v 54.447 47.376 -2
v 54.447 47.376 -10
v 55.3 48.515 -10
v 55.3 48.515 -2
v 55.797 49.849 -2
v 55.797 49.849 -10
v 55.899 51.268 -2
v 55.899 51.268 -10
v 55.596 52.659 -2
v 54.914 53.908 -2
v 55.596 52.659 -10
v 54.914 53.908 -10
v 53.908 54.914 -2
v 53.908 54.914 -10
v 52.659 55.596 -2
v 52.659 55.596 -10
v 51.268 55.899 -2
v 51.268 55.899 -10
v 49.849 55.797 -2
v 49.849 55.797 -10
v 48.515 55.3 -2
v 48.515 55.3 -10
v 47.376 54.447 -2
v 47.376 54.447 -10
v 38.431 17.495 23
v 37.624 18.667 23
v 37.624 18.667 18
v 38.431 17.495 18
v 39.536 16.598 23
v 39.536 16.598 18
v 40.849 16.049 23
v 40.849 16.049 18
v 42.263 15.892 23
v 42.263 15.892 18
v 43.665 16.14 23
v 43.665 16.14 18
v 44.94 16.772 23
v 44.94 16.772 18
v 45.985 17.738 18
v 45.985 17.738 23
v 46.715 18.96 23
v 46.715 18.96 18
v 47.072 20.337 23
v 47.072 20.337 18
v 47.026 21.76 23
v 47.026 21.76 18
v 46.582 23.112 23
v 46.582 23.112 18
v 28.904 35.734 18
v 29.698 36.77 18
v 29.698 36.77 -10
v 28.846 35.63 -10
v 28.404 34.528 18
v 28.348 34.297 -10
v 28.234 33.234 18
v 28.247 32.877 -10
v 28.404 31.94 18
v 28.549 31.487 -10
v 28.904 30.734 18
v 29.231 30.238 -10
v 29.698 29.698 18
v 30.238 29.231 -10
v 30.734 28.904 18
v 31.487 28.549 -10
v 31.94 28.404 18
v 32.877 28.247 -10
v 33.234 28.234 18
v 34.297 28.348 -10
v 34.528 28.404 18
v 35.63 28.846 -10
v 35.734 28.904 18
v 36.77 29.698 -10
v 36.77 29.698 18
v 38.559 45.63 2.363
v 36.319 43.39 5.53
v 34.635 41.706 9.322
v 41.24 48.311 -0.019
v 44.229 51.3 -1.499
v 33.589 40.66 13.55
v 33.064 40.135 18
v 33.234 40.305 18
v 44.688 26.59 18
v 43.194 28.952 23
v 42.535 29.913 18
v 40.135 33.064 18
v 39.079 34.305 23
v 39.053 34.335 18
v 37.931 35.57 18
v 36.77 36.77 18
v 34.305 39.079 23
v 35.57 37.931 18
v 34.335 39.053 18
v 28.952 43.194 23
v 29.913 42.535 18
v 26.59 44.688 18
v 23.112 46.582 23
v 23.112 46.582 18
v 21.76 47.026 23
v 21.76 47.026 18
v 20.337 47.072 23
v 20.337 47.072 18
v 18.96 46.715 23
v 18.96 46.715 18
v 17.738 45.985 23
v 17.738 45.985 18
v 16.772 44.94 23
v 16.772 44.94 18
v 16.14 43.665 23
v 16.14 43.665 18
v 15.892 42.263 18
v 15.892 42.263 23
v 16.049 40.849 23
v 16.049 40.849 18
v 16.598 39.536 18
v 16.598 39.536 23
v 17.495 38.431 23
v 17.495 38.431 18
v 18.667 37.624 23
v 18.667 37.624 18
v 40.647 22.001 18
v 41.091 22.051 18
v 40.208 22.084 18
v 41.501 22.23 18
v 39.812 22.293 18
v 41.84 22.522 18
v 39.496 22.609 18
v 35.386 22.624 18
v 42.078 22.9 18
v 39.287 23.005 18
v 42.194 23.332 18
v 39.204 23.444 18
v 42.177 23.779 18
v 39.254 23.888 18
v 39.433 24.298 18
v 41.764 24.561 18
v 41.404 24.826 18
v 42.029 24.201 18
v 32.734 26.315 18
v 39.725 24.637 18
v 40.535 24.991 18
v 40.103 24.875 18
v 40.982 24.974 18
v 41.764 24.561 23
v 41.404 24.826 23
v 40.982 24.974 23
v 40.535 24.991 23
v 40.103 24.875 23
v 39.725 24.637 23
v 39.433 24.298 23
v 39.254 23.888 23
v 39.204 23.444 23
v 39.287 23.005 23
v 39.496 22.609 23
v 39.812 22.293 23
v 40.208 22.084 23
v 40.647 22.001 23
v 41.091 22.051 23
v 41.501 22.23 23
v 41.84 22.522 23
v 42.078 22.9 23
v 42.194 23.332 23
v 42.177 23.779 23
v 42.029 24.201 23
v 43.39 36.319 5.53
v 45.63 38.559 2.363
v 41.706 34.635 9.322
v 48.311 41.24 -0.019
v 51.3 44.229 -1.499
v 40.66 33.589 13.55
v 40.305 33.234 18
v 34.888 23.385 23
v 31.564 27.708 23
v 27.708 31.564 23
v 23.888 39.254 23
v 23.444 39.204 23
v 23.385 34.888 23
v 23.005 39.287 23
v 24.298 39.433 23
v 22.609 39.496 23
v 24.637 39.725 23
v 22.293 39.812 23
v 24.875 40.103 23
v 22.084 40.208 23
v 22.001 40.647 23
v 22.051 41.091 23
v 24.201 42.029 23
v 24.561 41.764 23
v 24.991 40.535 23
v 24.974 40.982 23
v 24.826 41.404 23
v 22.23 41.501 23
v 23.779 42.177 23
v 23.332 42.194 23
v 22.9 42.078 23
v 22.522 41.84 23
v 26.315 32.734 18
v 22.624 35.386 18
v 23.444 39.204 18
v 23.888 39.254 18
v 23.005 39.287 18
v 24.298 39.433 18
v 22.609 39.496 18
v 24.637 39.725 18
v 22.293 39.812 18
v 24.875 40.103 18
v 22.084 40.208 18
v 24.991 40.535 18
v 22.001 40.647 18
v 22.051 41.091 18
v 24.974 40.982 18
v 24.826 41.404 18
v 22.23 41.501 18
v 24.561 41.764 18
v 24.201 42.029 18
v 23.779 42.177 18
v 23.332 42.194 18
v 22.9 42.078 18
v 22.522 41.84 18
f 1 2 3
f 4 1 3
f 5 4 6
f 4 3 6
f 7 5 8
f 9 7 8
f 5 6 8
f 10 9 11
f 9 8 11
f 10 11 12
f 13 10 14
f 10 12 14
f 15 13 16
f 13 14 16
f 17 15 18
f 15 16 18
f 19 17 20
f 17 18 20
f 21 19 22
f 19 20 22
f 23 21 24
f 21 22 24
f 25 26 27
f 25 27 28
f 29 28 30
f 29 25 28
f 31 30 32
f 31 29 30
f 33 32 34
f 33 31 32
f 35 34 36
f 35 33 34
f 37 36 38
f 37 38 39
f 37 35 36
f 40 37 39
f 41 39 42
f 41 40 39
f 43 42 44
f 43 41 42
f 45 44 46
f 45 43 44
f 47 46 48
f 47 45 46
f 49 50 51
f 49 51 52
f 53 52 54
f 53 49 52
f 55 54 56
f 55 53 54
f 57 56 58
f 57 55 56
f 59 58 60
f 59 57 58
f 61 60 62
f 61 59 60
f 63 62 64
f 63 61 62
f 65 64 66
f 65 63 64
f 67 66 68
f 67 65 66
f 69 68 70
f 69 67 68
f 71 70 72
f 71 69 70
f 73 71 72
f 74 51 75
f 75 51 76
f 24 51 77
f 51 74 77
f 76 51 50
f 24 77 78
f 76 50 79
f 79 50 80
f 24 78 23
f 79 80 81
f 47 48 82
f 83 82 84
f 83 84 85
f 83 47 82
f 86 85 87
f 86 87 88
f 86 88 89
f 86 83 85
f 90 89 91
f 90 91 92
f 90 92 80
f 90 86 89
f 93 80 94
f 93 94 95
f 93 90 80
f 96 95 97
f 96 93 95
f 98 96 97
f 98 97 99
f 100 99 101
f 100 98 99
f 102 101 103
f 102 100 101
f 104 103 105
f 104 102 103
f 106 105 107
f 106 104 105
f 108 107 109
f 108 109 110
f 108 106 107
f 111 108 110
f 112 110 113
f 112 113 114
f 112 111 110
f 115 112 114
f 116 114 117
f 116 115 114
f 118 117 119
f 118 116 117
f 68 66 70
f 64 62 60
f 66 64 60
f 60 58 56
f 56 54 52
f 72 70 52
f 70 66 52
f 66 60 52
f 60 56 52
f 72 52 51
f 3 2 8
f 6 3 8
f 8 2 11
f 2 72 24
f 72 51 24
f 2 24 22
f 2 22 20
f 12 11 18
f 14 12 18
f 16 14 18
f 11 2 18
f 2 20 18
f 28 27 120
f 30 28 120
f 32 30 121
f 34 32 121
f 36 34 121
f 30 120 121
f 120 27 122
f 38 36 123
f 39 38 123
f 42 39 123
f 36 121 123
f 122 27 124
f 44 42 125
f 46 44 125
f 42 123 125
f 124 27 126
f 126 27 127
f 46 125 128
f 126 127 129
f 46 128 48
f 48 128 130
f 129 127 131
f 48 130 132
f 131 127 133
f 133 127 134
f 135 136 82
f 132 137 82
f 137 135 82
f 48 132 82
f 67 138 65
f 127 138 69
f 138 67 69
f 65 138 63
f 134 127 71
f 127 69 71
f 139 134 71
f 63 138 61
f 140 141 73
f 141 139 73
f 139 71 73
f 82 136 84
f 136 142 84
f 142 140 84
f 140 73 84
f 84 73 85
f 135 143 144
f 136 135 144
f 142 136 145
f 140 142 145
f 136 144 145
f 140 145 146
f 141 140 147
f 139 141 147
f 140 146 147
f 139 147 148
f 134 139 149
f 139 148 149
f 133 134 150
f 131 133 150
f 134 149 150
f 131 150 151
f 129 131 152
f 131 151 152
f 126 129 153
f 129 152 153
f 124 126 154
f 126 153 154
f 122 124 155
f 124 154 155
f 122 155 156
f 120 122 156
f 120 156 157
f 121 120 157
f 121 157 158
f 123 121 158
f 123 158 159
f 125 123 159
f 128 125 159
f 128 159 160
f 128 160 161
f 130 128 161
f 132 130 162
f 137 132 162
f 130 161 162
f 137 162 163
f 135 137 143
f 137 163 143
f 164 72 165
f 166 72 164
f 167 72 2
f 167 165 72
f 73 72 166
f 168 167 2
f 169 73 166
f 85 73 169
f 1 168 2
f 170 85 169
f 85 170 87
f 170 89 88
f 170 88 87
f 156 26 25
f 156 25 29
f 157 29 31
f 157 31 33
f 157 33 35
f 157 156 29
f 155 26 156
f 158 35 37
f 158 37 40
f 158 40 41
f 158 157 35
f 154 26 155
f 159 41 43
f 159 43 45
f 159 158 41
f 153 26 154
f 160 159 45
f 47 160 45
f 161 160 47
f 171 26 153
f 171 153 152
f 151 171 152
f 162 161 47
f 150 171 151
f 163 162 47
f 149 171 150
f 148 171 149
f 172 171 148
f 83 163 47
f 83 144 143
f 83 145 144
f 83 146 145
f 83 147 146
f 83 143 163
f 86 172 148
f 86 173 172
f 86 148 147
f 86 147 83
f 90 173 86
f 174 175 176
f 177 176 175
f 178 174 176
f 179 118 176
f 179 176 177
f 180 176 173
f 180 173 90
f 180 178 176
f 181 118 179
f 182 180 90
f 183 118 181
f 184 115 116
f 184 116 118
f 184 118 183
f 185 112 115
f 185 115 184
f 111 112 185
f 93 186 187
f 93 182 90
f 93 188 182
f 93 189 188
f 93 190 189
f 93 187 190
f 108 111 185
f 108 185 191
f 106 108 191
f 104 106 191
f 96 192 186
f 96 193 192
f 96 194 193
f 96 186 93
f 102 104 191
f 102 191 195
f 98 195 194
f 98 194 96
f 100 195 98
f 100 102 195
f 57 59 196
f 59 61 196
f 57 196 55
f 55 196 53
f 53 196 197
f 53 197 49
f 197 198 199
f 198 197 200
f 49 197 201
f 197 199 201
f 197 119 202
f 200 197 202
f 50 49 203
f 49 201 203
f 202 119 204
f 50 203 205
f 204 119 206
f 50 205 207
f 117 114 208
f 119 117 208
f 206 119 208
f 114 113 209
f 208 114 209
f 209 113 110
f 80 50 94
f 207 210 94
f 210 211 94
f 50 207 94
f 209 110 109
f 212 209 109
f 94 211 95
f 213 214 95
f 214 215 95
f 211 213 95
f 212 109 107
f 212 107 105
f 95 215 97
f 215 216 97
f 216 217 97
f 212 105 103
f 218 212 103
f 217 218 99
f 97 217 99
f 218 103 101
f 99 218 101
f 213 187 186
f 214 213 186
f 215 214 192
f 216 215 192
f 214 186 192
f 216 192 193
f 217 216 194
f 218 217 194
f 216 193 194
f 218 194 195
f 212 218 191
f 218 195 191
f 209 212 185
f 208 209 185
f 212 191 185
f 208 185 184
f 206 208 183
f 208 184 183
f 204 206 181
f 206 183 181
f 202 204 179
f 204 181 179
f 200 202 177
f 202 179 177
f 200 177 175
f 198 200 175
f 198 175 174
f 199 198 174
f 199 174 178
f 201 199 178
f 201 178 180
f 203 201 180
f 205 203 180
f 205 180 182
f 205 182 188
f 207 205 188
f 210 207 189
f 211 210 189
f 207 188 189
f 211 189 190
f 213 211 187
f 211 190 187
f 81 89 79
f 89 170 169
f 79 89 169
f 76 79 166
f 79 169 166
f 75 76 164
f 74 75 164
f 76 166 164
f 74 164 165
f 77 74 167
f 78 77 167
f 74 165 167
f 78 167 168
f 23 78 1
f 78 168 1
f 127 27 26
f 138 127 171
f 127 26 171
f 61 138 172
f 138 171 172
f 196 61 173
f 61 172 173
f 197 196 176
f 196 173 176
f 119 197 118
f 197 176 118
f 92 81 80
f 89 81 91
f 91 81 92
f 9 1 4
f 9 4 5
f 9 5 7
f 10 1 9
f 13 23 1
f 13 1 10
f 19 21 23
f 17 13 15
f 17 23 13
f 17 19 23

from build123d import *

# Parameters (mm, degrees)
SKETCH014_R             = 1.5
PAD007_DEPTH            = 5
SKETCH015_R             = 5
PAD008_DEPTH            = 33
PAD009_DEPTH            = 5
PAD010_DEPTH            = 8
BODY004_PLACEMENT_ANGLE = 45


with BuildPart() as part:
    # Sketch014 → Pad007 (new body)
    with BuildSketch(Plane.XY):
        with BuildLine():
            ThreePointArc((49.280643, -16.595729), (52, 9e-06), (49.280638, 16.595745))
            ThreePointArc((49.280638, 16.595745), (42.946367, 19.738522), (39.803594, 13.404249))
            ThreePointArc((39.803592, -13.404255), (42, -3e-06), (39.803594, 13.404249))
            ThreePointArc((39.803592, -13.404255), (42.946378, -19.738526), (49.280643, -16.595729))
        make_face()
        with Locations((45.398514, 12.164495)):
            Circle(SKETCH014_R, mode=Mode.SUBTRACT)
        with Locations((45.398514, -12.164495)):
            Circle(SKETCH014_R, mode=Mode.SUBTRACT)
    extrude(amount=-PAD007_DEPTH)

    # Sketch015 → Pad008 (join)
    with BuildSketch(Plane.XY):
        with Locations((47, 0)):
            Circle(SKETCH015_R)
    extrude(amount=-PAD008_DEPTH)

    # Sketch016 → Pad009 (join, symmetric)
    with BuildSketch(Plane.XZ):
        with BuildLine():
            Line((47, -5), (47, -33))
            Line((47, -33), (72, -33))
            Line((72, -33), (72, -25))
            ThreePointArc((52, -5), (57.857864, -19.142136), (72, -25))
            Line((52, -5), (47, -5))
        make_face()
    extrude(amount=PAD009_DEPTH, both=True)

    # Sketch017 → Pad010 (join)
    with BuildSketch(Plane.XY.offset(-33)):
        with BuildLine():
            ThreePointArc((72, -5), (77, 0), (72, 5))
            Line((72, 5), (72, -5))
        make_face()
    extrude(amount=PAD010_DEPTH)


with BuildPart() as part_1:
    # Body004 placement: moved
    add(part.part.moved(Location((0, 0, 23))).rotate(Axis((0, 0, 23), (0, 0, 1)), BODY004_PLACEMENT_ANGLE))


solid = part_1.part
